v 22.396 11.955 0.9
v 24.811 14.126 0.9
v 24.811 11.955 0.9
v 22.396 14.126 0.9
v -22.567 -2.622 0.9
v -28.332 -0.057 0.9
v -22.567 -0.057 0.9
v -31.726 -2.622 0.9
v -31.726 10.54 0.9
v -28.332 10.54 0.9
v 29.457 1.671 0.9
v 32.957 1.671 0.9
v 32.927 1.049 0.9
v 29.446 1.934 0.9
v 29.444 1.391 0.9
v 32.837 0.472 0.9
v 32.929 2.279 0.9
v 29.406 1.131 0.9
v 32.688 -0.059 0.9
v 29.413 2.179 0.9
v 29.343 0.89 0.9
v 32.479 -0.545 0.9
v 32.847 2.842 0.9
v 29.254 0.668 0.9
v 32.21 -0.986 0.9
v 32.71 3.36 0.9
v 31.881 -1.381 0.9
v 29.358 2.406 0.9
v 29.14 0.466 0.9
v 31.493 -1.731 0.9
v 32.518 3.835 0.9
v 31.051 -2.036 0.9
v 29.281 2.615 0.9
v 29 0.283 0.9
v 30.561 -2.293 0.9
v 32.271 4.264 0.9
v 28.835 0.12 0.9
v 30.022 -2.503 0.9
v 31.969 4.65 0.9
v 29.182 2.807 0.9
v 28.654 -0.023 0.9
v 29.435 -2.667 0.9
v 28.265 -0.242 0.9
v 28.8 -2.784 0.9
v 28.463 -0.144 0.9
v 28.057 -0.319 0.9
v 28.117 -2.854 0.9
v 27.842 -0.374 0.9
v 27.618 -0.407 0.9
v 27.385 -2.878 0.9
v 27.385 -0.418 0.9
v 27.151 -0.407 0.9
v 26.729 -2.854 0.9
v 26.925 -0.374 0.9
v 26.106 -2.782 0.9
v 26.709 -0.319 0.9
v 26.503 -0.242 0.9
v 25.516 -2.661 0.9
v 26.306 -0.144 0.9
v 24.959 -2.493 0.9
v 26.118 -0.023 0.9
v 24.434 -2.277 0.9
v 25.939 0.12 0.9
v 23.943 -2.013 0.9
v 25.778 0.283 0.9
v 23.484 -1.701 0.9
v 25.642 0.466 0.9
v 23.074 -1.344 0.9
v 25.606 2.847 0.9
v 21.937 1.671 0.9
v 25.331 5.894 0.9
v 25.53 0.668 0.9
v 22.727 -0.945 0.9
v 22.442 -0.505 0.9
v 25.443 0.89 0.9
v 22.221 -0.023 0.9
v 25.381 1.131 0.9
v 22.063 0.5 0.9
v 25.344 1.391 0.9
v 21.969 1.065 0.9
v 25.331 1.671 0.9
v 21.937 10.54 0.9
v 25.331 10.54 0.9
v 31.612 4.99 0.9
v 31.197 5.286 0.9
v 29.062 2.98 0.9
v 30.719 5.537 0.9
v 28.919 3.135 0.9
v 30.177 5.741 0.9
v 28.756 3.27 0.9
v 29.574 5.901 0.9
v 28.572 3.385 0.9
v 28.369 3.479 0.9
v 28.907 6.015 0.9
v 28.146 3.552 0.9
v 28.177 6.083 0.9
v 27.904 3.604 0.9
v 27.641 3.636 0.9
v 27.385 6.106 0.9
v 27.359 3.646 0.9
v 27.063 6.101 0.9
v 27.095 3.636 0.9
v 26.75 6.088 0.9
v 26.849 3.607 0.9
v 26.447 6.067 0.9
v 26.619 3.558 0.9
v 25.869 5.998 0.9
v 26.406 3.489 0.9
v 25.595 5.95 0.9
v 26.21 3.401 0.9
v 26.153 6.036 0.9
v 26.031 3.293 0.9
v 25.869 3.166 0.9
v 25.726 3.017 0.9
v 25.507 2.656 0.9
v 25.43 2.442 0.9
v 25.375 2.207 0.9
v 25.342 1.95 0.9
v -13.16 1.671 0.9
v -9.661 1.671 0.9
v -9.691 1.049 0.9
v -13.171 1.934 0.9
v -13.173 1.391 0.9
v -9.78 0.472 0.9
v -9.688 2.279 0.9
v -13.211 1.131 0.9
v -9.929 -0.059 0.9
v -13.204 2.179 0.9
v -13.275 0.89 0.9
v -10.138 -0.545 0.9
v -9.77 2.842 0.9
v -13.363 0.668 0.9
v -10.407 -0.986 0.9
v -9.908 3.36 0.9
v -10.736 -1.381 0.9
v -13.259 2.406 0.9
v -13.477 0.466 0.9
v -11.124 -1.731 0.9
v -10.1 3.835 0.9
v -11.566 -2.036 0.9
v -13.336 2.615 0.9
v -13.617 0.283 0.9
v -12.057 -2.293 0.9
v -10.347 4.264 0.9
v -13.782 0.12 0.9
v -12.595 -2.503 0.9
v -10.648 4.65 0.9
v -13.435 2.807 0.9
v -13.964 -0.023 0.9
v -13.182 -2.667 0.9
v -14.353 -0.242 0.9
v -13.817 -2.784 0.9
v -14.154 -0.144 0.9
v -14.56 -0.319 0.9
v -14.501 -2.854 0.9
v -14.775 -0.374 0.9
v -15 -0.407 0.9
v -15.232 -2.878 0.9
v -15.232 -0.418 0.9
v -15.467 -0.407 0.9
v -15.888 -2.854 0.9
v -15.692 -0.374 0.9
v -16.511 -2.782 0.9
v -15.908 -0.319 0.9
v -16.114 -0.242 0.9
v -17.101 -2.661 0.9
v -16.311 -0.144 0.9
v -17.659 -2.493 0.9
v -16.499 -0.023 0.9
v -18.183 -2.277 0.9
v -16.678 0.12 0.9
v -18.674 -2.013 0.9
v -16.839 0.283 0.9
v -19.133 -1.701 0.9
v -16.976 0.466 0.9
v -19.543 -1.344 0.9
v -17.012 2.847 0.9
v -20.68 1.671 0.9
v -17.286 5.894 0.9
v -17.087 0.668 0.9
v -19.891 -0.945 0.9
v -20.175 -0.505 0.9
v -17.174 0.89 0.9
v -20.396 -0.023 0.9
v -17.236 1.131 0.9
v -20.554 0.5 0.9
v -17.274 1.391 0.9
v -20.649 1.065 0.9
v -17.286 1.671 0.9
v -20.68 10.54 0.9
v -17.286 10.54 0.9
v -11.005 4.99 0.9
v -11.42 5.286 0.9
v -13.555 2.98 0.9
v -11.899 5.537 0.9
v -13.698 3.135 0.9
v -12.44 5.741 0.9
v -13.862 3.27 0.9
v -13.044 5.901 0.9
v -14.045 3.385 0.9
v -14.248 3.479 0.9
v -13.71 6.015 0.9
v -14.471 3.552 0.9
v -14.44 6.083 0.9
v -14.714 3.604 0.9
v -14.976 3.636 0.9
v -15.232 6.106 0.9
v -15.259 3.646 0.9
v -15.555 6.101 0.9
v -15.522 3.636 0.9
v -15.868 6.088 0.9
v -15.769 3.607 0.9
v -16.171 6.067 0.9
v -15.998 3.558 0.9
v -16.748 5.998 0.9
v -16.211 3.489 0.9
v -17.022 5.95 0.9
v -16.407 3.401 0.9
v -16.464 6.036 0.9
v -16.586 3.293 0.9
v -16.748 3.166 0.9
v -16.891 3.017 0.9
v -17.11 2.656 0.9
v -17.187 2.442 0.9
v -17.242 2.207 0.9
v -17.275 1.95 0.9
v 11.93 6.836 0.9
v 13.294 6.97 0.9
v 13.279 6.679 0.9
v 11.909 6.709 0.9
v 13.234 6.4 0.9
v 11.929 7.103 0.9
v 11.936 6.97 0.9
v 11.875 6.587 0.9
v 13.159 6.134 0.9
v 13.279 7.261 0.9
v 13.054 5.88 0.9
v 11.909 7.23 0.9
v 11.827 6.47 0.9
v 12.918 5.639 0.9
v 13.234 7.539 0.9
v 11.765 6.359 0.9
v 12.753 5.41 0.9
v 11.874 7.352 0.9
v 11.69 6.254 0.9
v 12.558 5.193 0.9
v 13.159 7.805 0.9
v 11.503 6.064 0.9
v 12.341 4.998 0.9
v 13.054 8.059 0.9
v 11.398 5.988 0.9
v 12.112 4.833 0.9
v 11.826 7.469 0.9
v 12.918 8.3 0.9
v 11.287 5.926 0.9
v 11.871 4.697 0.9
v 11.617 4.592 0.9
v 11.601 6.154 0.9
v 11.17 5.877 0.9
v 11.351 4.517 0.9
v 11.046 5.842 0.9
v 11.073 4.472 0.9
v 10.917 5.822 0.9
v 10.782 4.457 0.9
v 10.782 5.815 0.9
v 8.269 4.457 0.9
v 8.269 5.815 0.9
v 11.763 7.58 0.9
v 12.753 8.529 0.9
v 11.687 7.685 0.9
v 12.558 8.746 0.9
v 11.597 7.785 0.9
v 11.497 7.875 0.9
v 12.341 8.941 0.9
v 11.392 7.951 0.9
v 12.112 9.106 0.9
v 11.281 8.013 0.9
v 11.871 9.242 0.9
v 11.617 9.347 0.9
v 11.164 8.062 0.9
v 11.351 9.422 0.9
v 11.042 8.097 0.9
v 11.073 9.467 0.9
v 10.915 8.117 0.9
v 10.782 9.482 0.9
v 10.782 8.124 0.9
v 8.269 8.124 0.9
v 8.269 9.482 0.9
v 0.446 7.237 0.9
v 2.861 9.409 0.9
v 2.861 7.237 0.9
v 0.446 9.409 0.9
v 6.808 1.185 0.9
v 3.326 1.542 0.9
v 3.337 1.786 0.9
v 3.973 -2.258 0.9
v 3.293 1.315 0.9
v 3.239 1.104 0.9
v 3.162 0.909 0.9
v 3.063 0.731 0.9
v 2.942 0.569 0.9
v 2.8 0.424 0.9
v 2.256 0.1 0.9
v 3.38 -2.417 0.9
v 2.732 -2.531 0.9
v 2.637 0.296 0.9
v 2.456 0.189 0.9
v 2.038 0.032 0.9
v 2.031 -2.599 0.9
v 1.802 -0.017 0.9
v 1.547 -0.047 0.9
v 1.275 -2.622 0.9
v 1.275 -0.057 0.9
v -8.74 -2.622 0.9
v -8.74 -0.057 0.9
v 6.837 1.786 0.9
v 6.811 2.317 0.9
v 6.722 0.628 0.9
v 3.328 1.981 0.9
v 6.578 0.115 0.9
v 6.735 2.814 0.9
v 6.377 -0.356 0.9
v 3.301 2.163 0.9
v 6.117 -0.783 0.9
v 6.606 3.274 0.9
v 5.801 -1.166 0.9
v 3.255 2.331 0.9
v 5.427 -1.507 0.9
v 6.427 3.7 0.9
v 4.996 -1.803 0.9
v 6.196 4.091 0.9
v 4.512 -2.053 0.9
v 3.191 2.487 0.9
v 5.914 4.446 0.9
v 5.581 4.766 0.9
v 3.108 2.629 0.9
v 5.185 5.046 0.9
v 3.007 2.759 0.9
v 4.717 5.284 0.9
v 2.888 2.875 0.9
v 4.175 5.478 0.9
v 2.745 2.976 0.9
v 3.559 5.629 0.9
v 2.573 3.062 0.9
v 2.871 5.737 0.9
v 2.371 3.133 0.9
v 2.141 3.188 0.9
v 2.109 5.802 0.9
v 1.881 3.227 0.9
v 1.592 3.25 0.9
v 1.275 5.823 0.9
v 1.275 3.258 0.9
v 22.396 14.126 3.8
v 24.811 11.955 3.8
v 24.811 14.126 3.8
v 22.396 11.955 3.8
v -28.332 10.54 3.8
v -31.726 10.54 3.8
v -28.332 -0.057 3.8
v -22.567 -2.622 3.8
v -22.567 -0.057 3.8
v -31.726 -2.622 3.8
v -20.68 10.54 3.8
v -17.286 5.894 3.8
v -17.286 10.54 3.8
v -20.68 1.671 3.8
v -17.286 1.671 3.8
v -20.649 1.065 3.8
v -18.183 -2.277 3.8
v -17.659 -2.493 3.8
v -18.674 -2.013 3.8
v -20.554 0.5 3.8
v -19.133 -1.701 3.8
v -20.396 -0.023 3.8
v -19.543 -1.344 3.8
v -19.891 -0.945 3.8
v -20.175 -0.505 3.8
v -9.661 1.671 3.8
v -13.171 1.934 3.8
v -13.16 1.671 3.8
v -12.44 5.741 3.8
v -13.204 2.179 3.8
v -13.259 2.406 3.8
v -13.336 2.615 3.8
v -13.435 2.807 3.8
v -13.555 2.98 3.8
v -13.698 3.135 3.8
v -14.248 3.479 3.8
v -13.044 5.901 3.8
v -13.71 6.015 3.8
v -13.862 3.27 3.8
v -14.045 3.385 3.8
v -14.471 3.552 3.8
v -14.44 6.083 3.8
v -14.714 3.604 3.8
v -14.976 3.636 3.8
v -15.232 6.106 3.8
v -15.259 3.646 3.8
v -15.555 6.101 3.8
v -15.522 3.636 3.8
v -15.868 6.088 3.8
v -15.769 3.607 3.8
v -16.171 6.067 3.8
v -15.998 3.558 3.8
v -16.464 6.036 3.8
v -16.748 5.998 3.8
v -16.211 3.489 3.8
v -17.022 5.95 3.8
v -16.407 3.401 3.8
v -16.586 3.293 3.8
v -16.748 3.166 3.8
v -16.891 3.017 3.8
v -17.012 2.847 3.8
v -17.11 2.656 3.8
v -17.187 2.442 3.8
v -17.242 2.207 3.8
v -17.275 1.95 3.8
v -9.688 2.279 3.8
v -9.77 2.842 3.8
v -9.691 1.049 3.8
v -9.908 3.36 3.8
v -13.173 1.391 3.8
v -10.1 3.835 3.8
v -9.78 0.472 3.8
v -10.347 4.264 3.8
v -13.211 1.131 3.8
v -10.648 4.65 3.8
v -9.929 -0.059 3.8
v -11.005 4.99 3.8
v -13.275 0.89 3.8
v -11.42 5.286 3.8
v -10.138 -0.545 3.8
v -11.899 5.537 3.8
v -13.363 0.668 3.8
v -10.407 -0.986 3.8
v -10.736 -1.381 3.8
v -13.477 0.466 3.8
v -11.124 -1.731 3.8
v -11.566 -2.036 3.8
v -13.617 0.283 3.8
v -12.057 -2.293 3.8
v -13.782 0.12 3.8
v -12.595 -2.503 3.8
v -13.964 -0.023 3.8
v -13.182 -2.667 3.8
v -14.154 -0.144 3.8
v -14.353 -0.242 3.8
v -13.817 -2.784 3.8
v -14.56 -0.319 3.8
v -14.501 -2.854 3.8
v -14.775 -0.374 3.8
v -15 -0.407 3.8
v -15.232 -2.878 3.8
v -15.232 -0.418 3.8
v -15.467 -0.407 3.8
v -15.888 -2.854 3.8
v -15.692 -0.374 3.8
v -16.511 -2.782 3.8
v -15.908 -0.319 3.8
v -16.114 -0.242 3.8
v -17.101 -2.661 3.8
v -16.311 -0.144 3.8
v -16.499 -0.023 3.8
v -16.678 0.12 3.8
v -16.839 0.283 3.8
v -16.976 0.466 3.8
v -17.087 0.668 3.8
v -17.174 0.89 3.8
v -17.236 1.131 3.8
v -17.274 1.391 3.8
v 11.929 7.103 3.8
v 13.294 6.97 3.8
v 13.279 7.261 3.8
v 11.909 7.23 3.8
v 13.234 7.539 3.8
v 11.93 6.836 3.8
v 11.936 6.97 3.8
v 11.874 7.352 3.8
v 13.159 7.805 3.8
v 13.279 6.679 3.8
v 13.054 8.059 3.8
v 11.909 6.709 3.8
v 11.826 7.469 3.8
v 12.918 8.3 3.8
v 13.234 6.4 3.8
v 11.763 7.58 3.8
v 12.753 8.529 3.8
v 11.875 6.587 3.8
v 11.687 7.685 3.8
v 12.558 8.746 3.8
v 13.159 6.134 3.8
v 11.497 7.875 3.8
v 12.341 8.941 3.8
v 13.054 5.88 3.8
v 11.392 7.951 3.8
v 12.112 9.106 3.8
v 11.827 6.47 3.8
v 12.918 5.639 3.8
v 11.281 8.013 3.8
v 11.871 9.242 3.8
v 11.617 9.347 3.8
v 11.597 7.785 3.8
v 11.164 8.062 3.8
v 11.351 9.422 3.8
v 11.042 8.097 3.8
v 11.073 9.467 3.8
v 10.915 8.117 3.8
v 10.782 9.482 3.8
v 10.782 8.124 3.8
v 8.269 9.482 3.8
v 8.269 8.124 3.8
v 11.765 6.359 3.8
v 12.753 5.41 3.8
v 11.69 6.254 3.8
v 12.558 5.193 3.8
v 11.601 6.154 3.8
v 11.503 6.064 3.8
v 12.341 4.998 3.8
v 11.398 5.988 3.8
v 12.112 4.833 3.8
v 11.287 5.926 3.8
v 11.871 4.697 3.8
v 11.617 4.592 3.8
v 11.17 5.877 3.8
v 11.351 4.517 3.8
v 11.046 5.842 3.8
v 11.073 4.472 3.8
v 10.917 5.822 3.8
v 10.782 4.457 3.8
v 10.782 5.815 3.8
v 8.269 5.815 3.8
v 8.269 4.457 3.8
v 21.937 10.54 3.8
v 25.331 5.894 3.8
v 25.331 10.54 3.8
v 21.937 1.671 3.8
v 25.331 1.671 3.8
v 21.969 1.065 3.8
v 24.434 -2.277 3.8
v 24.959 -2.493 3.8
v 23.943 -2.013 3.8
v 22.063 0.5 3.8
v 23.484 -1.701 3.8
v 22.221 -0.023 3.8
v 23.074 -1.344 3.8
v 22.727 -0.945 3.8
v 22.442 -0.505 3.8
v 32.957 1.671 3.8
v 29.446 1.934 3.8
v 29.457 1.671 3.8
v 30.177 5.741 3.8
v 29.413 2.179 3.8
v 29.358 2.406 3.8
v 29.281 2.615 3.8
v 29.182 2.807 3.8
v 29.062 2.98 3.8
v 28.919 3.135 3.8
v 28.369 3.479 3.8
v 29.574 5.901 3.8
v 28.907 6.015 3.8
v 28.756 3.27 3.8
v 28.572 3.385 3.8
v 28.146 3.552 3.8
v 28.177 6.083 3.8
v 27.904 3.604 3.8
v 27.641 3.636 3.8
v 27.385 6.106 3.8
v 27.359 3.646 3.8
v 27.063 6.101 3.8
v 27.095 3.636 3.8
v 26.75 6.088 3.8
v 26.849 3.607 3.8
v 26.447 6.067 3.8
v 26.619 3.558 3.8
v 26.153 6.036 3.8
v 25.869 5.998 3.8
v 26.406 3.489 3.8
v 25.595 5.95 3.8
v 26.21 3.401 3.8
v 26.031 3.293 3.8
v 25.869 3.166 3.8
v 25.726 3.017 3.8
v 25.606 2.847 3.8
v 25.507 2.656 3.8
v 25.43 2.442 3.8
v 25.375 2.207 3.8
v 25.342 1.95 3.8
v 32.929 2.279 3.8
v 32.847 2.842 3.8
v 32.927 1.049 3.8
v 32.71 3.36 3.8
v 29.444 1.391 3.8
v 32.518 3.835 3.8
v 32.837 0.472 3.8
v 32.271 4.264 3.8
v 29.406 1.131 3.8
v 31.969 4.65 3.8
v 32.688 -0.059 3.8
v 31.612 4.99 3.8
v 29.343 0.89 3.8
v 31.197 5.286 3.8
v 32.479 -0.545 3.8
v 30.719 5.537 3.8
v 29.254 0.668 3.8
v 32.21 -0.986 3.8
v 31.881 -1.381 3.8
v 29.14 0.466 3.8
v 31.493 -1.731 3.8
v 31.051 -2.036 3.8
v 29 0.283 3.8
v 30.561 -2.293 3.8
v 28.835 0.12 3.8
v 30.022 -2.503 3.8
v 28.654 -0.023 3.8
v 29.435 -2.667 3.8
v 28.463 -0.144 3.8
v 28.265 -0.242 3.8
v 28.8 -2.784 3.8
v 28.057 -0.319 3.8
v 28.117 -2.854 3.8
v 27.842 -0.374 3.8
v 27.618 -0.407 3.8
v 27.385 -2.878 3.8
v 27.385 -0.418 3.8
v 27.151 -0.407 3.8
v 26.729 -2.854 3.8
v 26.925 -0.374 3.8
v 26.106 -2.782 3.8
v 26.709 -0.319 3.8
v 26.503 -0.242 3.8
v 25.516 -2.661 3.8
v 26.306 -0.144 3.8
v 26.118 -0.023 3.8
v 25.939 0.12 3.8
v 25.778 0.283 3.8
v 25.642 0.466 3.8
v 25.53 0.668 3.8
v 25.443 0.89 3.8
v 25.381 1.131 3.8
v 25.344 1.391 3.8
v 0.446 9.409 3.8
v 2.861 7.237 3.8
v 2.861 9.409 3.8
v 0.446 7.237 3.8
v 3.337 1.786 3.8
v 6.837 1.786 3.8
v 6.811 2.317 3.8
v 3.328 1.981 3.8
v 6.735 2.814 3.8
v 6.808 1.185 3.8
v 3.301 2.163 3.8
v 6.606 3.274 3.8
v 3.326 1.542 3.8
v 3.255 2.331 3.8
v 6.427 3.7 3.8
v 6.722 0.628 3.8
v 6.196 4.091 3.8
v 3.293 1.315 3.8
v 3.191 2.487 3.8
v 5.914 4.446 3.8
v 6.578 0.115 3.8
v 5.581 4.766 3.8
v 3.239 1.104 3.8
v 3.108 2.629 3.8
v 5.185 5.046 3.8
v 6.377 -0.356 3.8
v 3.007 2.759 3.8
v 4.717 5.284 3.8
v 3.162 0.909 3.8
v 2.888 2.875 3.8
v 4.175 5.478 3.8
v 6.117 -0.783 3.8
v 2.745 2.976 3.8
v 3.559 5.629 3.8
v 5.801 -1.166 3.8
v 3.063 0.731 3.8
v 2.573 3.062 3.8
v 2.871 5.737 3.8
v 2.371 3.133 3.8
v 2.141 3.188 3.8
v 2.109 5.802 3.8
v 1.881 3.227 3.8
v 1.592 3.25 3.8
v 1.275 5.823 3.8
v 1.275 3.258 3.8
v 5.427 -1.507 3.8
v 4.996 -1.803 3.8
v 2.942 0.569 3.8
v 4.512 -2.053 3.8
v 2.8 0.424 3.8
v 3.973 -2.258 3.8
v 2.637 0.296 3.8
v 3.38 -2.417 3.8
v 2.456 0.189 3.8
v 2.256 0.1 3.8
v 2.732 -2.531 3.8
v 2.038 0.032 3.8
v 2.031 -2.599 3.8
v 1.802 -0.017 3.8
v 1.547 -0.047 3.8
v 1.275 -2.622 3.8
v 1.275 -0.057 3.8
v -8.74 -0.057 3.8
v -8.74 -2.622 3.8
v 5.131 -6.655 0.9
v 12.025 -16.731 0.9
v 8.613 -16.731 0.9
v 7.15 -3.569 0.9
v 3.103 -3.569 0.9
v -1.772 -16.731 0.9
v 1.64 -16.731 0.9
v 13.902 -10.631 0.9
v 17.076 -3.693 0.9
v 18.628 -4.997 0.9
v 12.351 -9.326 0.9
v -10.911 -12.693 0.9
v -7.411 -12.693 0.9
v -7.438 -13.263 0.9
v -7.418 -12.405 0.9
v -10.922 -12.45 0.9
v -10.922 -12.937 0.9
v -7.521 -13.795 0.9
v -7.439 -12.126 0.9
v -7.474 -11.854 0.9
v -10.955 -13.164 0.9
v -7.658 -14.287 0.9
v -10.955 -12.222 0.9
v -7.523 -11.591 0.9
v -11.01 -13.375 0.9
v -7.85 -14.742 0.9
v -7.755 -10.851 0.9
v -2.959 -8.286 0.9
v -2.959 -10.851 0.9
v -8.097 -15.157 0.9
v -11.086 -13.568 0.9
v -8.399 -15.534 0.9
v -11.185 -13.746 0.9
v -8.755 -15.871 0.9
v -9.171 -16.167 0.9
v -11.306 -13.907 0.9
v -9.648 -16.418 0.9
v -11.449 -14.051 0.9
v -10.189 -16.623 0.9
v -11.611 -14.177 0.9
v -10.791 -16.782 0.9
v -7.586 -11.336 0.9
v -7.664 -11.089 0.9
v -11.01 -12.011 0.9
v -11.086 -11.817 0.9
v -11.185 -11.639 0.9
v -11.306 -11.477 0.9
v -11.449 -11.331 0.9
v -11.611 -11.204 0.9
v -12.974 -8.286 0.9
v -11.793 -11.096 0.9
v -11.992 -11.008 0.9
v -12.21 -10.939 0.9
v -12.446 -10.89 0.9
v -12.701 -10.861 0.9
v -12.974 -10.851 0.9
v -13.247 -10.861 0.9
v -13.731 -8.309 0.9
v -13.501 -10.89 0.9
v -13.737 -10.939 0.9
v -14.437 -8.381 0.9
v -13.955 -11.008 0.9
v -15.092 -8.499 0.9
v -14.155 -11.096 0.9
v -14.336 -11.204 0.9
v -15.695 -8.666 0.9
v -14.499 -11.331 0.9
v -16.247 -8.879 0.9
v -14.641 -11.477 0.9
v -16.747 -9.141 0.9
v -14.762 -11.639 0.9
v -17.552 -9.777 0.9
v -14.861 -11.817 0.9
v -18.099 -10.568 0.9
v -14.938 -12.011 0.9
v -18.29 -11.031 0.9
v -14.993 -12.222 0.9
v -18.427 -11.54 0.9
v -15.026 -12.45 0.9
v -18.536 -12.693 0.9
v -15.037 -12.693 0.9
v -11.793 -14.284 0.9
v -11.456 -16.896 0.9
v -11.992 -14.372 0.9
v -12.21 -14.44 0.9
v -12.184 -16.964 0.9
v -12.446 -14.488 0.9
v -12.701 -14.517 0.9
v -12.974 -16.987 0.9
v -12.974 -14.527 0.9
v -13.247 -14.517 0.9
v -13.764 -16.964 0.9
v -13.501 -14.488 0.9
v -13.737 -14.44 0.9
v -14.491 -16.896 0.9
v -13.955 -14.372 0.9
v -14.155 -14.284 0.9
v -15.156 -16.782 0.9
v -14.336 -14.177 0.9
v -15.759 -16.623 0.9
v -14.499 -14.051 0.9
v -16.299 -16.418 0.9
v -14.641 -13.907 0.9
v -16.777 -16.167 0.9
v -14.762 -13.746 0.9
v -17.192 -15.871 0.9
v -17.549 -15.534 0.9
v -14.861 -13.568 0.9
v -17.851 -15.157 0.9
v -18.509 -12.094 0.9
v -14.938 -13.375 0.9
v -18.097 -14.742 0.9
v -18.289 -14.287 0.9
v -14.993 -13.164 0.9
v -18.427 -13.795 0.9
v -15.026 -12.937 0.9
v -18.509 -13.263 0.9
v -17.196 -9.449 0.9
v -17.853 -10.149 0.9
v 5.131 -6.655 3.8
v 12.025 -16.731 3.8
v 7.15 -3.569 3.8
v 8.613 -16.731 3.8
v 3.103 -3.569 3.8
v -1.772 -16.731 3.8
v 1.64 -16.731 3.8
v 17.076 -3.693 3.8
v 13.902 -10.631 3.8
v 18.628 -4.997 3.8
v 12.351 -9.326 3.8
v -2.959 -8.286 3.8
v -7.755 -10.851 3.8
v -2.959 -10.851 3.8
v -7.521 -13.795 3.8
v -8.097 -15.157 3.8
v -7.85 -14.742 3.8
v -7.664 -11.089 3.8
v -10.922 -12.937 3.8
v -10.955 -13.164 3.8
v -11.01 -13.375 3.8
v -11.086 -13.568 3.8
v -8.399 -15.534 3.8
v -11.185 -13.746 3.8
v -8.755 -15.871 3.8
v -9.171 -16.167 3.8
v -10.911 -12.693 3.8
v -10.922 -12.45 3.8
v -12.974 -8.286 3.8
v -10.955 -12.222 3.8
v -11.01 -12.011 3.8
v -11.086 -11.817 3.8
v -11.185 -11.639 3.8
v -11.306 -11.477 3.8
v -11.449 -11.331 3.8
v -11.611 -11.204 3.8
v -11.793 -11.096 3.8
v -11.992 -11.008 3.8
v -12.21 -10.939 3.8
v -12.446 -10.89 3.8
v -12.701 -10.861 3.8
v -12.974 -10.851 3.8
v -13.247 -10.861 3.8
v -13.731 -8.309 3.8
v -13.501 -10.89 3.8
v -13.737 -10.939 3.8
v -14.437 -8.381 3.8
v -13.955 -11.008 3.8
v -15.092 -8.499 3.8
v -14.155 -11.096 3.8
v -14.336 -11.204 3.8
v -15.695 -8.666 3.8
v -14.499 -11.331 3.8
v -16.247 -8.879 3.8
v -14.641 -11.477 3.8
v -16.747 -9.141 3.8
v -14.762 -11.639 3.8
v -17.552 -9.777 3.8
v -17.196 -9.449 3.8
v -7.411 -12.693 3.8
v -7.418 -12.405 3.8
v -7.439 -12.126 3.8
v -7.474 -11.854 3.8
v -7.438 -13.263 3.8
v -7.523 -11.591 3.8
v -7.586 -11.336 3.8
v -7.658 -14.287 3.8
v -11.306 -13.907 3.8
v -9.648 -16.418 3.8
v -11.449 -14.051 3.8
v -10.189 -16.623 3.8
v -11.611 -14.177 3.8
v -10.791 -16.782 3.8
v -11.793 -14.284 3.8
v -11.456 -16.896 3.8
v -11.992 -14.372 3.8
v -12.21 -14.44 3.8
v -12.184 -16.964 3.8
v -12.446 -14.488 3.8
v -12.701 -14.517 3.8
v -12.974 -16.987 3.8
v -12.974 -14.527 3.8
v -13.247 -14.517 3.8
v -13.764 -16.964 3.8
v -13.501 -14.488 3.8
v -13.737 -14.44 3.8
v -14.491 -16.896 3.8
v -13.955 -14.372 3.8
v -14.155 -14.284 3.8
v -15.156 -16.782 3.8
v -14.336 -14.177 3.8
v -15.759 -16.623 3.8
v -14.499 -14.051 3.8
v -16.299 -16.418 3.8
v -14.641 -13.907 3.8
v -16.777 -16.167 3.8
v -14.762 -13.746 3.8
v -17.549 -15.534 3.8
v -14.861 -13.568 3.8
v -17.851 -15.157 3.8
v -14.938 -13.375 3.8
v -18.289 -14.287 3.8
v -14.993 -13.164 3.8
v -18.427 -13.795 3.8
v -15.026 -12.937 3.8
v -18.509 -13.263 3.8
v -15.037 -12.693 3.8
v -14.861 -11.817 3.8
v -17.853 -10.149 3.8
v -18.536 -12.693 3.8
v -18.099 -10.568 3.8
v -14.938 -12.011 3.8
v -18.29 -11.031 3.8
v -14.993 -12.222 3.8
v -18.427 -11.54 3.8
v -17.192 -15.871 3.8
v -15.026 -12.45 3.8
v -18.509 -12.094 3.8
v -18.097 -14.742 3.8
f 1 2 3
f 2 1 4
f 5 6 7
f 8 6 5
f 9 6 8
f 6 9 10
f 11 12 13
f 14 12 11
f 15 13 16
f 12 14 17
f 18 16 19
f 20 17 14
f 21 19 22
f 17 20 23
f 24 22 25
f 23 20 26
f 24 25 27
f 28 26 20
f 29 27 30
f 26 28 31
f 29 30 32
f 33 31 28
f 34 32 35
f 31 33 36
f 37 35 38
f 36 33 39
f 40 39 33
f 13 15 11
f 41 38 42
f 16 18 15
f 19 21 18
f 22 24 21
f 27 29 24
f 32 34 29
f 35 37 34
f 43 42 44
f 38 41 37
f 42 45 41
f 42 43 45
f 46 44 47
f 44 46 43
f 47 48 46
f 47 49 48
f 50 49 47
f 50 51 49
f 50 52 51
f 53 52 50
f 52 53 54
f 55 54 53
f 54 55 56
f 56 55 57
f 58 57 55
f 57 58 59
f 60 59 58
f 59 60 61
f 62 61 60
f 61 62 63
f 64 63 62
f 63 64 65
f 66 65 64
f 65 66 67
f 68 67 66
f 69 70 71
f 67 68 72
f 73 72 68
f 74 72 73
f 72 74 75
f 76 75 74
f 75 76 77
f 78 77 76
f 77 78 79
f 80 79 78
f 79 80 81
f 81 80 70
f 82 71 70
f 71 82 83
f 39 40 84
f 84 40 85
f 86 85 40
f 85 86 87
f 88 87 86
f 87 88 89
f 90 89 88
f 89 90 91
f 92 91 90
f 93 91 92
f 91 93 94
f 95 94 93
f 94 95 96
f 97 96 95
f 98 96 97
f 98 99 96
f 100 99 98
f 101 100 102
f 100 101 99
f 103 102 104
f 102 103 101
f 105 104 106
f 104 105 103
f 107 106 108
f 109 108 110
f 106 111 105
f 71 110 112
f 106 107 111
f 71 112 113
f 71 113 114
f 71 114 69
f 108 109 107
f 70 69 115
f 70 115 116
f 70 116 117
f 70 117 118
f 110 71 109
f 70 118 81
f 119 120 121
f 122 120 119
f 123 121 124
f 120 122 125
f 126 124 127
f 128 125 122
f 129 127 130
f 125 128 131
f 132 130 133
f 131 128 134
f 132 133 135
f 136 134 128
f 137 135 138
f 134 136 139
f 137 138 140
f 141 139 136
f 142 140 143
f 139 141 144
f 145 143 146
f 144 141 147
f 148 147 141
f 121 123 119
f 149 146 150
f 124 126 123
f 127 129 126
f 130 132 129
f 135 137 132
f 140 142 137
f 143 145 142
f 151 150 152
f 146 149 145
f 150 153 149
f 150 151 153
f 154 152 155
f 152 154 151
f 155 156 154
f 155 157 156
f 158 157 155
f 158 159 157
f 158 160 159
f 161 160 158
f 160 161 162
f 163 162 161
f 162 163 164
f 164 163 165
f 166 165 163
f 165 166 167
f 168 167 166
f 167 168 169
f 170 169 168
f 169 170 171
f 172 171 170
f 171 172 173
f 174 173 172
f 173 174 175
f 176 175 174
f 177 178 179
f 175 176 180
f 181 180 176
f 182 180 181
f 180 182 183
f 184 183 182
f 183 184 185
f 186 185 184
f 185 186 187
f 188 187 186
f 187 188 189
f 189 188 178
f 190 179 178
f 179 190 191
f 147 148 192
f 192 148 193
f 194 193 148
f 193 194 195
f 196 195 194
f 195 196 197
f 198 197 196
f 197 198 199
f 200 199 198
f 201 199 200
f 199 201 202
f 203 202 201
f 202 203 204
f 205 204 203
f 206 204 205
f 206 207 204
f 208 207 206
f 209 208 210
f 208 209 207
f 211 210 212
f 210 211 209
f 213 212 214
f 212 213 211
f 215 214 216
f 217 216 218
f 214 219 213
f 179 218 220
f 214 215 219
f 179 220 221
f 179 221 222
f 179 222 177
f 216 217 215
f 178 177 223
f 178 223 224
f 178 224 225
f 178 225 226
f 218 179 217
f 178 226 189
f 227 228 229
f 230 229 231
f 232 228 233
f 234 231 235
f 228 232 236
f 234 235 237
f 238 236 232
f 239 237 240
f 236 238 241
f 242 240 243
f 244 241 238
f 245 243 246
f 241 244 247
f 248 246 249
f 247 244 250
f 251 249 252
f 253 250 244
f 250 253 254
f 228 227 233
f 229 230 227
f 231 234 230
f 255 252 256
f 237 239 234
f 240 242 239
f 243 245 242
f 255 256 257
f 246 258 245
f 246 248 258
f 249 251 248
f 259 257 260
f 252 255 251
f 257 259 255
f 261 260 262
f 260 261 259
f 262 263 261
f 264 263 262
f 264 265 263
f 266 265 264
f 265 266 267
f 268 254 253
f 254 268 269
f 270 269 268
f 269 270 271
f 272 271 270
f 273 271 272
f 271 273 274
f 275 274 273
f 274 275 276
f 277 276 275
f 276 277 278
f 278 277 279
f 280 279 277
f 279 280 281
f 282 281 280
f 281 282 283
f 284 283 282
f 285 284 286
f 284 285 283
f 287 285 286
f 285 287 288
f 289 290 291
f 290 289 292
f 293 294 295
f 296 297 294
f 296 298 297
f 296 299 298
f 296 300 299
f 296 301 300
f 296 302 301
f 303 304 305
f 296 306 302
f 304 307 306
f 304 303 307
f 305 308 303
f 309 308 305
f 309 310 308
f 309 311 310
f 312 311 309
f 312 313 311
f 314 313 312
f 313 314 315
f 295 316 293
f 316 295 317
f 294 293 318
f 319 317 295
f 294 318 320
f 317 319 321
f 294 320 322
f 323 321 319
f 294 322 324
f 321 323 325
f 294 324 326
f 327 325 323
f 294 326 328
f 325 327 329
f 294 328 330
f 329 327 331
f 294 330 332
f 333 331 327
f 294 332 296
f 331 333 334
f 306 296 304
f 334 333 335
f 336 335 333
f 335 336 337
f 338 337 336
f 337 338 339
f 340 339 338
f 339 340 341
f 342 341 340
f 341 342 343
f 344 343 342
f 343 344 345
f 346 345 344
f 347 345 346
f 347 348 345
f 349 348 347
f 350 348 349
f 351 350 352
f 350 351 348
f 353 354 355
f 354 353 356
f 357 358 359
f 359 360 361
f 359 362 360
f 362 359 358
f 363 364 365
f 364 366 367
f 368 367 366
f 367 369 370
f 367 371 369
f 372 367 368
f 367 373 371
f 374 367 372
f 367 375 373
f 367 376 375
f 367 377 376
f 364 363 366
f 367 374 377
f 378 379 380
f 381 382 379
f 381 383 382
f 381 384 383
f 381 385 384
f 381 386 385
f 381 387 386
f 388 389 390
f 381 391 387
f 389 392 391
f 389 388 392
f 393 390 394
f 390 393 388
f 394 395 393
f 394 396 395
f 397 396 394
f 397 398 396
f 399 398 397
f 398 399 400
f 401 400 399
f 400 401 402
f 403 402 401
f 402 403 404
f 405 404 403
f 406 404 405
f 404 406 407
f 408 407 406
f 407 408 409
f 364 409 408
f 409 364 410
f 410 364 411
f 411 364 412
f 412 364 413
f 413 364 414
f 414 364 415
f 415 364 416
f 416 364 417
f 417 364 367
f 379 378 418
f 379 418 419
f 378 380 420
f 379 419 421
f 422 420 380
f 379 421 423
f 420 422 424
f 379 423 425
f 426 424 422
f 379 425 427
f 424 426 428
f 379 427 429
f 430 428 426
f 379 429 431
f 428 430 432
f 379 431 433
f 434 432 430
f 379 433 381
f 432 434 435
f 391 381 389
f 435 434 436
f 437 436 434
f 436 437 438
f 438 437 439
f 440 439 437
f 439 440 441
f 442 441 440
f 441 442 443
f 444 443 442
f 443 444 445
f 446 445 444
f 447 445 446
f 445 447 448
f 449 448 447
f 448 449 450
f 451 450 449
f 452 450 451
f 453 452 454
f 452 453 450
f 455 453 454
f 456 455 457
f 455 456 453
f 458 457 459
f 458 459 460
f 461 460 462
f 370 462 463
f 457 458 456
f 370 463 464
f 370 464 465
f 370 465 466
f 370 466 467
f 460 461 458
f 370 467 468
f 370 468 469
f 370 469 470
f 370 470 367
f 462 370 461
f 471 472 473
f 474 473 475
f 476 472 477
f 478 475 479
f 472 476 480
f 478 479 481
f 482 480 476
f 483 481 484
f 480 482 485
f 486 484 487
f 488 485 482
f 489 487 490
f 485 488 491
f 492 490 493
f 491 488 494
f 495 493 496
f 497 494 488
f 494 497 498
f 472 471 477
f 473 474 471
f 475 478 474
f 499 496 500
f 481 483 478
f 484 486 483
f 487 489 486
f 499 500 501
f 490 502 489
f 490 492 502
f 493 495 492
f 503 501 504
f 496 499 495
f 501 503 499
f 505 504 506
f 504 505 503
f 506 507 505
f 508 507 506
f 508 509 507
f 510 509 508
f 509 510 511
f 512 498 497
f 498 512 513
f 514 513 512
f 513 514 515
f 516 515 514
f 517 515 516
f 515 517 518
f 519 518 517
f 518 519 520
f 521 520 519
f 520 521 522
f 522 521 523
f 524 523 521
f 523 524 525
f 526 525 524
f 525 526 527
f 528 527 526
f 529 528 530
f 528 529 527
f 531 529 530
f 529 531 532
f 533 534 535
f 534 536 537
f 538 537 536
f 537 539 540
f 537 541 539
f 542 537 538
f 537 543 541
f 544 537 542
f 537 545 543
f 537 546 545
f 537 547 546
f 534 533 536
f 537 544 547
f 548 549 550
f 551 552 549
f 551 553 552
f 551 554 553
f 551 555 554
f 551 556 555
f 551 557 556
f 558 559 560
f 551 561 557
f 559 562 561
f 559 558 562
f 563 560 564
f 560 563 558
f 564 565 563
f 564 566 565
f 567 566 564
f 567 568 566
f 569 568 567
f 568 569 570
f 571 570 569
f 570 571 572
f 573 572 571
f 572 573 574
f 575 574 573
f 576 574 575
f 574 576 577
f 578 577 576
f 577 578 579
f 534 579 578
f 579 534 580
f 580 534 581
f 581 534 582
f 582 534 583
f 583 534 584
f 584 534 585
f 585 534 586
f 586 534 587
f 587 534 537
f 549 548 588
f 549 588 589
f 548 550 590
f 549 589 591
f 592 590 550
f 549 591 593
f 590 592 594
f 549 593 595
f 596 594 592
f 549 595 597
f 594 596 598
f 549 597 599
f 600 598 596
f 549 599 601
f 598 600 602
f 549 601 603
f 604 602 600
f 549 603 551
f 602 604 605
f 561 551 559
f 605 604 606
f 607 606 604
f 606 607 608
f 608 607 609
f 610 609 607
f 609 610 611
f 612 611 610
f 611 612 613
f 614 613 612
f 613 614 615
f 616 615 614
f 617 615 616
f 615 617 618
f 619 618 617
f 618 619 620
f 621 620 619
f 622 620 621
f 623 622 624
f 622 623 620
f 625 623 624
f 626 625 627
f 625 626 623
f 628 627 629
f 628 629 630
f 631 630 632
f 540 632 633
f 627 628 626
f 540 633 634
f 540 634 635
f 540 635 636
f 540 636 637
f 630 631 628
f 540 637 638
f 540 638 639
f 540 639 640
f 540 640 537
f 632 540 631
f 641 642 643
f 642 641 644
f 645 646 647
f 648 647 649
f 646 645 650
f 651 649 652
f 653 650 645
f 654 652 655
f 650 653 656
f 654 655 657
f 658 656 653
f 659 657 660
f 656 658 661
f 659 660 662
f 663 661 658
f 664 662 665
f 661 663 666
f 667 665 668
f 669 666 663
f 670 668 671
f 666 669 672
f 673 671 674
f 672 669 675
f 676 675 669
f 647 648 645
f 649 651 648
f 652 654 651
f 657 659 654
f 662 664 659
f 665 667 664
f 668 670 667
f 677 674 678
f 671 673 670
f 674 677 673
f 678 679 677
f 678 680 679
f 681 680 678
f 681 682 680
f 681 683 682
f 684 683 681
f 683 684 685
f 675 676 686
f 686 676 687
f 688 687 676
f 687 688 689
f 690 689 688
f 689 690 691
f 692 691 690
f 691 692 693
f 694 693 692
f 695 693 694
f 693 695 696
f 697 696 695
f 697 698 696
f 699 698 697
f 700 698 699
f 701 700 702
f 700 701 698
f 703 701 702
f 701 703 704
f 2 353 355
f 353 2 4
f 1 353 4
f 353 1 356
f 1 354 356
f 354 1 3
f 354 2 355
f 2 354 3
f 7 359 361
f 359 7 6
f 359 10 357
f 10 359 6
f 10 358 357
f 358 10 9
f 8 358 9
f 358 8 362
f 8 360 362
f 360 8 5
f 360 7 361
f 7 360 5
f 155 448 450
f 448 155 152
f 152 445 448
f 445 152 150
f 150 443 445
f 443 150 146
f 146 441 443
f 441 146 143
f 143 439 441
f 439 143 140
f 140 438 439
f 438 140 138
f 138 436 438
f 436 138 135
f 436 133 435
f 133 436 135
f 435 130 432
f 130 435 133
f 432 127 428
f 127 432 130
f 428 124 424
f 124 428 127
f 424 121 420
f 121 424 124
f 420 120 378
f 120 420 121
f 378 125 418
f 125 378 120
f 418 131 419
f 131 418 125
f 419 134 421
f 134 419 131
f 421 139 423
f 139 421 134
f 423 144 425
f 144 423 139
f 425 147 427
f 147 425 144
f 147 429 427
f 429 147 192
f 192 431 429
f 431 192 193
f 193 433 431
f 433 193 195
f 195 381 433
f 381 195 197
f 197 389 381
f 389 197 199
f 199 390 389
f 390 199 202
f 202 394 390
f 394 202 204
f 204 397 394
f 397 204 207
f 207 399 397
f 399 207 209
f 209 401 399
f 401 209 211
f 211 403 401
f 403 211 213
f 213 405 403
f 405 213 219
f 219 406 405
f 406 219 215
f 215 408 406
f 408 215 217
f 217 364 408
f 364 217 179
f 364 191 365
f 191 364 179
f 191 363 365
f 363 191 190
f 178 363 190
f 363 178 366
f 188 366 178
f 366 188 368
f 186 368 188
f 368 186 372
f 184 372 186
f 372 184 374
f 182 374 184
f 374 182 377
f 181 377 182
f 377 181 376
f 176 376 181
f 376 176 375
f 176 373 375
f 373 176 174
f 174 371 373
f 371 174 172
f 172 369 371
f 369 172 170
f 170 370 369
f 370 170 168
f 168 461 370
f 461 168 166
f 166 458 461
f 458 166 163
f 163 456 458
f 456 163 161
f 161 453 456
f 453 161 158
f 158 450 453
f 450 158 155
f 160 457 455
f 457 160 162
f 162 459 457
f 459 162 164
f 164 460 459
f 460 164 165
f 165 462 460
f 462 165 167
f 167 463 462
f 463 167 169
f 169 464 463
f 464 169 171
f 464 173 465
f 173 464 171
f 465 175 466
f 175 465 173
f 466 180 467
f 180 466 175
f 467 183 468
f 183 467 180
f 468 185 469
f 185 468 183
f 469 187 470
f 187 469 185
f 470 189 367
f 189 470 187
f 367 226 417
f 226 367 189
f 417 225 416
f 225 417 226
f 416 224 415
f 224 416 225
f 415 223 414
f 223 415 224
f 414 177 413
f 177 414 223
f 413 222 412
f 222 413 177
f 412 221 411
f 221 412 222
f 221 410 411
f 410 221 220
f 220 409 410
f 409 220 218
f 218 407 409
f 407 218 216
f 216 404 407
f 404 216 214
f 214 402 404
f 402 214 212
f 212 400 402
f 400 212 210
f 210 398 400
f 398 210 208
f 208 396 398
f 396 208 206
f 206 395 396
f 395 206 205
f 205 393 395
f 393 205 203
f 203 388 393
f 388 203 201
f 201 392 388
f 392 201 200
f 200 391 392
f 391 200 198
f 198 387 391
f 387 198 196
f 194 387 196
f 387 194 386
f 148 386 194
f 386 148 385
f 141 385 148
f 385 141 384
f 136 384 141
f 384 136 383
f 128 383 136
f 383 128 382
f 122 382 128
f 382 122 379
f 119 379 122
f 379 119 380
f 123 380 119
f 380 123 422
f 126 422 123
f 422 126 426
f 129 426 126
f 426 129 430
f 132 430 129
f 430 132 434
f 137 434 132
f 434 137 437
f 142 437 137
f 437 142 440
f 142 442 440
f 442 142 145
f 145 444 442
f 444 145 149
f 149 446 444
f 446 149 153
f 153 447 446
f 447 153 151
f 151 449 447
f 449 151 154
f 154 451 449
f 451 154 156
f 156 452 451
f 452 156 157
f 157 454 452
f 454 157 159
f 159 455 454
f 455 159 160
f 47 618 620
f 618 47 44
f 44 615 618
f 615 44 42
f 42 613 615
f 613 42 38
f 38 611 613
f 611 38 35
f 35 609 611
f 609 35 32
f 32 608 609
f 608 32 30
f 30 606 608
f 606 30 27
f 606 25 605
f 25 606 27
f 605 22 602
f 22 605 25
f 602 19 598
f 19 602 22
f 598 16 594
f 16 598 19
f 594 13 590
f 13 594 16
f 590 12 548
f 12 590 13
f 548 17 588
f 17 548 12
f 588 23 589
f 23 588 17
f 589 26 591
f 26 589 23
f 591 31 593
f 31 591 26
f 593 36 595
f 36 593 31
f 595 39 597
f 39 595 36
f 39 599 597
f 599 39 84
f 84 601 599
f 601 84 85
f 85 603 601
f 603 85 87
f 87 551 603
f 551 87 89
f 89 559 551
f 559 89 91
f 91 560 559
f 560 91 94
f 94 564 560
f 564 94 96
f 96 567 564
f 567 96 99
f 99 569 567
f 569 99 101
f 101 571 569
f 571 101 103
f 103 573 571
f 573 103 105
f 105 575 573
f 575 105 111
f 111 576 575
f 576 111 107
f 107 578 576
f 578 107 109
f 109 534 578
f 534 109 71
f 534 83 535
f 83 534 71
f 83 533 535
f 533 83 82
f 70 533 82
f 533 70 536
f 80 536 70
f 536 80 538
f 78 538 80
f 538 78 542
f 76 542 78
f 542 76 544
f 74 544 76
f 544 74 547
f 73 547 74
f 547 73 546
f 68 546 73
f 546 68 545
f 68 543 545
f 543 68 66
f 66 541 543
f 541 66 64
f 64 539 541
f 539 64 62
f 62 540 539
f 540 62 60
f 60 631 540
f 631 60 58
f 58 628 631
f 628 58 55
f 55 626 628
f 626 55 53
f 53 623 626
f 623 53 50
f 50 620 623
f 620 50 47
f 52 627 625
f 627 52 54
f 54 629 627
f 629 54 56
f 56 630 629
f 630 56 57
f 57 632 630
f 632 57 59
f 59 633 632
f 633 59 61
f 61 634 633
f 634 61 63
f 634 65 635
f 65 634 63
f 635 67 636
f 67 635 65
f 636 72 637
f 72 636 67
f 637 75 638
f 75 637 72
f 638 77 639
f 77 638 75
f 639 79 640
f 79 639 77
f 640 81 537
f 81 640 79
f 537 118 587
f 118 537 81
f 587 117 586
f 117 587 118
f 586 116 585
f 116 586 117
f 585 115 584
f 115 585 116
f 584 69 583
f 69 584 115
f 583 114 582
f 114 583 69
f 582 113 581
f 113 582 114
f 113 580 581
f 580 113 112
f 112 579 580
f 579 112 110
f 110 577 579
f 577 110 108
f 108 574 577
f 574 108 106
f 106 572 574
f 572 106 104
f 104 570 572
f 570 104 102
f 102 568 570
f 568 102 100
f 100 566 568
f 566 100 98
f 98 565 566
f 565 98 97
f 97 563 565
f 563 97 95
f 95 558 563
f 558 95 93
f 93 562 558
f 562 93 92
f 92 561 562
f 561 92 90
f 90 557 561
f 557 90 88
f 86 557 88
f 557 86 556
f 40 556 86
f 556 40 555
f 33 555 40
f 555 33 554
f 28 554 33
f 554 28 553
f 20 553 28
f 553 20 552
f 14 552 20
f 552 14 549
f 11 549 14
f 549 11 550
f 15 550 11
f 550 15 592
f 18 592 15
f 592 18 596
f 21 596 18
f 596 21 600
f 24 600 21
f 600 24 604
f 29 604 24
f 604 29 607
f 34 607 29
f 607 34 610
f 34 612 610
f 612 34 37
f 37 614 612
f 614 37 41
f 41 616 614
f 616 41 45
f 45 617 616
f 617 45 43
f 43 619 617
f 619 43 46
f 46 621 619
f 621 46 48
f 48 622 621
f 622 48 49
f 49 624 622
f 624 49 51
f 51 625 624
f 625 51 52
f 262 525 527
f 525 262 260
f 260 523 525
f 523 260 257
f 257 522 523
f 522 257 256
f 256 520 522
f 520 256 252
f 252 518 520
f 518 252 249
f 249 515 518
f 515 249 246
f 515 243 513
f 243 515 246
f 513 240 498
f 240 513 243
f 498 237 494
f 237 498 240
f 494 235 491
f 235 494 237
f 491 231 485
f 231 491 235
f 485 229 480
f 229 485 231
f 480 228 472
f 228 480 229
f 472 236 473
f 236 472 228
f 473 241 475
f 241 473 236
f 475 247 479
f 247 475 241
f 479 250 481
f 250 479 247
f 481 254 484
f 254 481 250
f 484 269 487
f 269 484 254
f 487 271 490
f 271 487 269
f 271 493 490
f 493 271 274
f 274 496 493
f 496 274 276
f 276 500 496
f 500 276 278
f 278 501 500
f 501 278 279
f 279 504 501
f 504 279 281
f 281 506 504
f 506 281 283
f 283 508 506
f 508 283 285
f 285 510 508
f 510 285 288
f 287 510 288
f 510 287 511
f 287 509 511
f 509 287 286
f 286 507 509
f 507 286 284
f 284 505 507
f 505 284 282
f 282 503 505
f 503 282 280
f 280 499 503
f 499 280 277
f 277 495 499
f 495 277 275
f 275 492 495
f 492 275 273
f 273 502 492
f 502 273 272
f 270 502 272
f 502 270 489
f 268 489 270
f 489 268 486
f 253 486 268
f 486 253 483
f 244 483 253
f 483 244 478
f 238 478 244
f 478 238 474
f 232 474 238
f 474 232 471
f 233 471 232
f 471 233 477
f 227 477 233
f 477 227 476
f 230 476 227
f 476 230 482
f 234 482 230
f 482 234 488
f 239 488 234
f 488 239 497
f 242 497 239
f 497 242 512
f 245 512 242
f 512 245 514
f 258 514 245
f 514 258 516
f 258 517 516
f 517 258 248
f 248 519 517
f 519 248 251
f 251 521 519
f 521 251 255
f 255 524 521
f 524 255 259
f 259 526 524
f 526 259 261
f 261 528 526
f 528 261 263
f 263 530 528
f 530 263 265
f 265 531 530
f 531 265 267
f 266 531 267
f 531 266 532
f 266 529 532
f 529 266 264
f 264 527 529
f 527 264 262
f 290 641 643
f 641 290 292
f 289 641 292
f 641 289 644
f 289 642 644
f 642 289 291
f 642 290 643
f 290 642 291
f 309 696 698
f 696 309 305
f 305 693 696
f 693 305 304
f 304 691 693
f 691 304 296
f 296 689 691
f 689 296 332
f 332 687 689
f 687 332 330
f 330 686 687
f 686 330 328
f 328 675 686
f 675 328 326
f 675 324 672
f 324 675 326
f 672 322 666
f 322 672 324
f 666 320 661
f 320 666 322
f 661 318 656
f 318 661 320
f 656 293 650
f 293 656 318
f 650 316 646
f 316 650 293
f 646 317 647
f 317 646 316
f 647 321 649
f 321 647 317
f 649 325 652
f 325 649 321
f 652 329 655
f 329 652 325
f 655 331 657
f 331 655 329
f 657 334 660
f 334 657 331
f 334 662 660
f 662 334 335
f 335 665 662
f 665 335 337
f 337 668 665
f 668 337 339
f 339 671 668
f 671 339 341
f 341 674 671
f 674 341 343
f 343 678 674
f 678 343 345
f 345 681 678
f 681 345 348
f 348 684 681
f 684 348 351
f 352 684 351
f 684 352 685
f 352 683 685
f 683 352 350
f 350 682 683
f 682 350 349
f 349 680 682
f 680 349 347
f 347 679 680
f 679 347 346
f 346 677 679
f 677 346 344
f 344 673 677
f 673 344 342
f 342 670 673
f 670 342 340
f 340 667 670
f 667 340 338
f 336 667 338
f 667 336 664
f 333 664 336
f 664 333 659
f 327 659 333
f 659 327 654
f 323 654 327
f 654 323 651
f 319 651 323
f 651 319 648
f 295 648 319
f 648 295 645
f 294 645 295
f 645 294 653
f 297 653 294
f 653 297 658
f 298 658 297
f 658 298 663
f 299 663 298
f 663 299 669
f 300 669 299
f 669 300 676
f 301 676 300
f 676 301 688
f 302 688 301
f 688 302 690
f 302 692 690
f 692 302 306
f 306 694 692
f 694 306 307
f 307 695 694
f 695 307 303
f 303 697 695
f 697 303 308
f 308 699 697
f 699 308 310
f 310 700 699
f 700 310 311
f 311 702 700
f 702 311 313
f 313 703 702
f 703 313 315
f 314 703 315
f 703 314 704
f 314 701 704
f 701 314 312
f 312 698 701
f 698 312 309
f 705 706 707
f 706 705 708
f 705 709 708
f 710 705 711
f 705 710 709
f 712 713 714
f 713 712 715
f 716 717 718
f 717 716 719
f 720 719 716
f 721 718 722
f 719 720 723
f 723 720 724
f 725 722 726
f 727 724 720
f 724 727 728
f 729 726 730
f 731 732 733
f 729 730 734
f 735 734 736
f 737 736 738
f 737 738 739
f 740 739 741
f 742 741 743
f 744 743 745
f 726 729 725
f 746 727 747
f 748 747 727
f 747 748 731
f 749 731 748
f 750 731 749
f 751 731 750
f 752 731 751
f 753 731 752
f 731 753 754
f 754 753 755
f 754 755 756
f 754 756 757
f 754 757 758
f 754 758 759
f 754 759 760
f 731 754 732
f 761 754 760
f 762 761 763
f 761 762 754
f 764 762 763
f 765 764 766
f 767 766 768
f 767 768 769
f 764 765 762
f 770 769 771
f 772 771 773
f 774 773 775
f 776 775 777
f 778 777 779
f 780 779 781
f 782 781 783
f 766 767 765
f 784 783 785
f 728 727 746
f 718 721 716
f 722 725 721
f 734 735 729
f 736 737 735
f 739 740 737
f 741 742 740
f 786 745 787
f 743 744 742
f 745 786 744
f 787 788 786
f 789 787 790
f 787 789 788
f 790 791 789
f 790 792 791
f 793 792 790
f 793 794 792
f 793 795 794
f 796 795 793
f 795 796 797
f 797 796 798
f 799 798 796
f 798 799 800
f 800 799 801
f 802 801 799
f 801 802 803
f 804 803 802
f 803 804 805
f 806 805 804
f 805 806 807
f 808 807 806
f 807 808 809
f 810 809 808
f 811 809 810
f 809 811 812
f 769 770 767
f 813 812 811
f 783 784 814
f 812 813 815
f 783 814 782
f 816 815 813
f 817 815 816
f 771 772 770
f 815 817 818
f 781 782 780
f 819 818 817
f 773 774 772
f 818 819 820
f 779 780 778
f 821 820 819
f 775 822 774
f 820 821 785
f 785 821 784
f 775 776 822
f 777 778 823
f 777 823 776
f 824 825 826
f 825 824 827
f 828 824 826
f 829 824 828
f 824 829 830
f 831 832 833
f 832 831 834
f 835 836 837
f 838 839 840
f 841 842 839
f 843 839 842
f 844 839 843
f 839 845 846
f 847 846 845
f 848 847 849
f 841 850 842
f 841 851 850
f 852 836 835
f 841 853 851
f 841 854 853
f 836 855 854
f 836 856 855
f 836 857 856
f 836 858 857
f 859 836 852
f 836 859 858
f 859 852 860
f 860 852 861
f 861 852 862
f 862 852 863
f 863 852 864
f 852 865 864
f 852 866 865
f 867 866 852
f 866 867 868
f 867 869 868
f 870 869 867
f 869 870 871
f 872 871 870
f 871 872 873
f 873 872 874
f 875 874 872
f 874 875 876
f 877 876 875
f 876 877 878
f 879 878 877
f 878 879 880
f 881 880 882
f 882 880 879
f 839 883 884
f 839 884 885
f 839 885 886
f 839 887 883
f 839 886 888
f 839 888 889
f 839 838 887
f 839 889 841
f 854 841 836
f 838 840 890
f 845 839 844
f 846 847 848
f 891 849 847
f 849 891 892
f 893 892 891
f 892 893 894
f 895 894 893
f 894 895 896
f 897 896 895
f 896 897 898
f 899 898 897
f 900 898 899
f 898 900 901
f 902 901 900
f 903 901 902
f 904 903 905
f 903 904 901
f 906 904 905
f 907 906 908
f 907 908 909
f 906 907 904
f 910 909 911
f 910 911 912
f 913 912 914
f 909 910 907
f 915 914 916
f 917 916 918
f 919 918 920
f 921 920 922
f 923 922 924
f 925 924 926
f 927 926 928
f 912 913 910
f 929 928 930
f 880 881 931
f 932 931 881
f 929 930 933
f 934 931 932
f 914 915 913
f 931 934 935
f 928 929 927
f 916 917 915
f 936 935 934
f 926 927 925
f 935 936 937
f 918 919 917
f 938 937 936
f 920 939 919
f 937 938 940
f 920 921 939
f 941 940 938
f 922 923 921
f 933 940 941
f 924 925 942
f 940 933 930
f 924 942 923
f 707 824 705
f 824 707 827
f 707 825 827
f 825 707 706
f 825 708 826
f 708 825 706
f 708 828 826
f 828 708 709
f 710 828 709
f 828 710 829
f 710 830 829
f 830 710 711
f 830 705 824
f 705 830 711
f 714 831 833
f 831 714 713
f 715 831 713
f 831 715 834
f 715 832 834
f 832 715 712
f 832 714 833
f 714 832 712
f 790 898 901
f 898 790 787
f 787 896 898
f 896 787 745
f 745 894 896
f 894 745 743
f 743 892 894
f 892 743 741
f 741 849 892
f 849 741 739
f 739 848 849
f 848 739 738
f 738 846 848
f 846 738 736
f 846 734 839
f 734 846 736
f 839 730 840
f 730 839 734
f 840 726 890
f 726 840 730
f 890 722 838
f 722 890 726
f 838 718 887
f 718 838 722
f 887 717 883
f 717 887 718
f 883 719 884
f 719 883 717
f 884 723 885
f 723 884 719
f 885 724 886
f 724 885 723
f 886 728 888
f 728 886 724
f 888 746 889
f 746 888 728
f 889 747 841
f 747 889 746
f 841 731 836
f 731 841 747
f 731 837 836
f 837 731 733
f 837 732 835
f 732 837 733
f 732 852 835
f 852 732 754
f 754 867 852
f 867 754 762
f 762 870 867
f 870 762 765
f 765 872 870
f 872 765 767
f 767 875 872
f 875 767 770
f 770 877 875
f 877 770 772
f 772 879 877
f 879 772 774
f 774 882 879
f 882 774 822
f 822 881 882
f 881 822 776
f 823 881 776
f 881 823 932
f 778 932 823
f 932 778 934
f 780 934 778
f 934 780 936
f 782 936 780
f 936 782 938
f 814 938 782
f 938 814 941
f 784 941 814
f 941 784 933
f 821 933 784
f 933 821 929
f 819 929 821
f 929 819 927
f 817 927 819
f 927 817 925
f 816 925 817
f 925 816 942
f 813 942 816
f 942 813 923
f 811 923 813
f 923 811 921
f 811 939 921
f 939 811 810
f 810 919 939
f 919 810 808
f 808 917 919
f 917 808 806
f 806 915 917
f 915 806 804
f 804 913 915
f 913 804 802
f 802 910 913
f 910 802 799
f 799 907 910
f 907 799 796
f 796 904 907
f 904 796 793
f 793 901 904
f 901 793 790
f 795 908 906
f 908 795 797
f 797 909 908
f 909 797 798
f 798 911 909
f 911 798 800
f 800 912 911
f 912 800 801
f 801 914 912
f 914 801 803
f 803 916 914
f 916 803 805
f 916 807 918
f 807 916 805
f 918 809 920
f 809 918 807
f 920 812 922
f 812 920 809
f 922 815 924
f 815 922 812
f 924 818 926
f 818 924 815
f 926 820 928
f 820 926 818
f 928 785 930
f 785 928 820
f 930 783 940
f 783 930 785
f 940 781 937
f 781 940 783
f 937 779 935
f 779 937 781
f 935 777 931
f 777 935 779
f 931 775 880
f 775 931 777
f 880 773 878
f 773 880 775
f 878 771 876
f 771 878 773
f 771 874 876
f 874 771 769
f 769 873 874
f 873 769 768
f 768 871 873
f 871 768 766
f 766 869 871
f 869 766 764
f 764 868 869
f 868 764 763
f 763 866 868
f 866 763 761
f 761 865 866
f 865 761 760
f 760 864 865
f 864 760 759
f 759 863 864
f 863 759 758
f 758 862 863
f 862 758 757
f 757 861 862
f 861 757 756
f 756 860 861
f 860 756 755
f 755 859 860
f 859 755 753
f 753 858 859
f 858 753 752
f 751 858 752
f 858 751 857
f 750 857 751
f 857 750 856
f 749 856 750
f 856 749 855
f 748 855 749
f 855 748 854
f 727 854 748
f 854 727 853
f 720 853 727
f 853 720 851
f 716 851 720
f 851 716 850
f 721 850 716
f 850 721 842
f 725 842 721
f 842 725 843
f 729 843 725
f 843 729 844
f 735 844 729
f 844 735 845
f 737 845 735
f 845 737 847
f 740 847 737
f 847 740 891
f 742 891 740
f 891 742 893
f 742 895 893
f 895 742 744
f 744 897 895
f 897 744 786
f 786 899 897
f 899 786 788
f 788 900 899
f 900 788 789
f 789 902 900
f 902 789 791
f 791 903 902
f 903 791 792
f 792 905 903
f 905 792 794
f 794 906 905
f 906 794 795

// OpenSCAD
$fn = 48;
  // syllabics (overlaid on icon, tallest)
  translate([0, 5.430, 0.900]) linear_extrude(height=2.900) text("ᒪᑲᓘᐣ ᑳ", size=13.000, halign="center", valign="center", font="Euphemia UCAS:style=Bold");
  translate([0, -10.430, 0.900]) linear_extrude(height=2.900) text("ᓂᐱᐟ", size=13.000, halign="center", valign="center", font="Euphemia UCAS:style=Bold");
